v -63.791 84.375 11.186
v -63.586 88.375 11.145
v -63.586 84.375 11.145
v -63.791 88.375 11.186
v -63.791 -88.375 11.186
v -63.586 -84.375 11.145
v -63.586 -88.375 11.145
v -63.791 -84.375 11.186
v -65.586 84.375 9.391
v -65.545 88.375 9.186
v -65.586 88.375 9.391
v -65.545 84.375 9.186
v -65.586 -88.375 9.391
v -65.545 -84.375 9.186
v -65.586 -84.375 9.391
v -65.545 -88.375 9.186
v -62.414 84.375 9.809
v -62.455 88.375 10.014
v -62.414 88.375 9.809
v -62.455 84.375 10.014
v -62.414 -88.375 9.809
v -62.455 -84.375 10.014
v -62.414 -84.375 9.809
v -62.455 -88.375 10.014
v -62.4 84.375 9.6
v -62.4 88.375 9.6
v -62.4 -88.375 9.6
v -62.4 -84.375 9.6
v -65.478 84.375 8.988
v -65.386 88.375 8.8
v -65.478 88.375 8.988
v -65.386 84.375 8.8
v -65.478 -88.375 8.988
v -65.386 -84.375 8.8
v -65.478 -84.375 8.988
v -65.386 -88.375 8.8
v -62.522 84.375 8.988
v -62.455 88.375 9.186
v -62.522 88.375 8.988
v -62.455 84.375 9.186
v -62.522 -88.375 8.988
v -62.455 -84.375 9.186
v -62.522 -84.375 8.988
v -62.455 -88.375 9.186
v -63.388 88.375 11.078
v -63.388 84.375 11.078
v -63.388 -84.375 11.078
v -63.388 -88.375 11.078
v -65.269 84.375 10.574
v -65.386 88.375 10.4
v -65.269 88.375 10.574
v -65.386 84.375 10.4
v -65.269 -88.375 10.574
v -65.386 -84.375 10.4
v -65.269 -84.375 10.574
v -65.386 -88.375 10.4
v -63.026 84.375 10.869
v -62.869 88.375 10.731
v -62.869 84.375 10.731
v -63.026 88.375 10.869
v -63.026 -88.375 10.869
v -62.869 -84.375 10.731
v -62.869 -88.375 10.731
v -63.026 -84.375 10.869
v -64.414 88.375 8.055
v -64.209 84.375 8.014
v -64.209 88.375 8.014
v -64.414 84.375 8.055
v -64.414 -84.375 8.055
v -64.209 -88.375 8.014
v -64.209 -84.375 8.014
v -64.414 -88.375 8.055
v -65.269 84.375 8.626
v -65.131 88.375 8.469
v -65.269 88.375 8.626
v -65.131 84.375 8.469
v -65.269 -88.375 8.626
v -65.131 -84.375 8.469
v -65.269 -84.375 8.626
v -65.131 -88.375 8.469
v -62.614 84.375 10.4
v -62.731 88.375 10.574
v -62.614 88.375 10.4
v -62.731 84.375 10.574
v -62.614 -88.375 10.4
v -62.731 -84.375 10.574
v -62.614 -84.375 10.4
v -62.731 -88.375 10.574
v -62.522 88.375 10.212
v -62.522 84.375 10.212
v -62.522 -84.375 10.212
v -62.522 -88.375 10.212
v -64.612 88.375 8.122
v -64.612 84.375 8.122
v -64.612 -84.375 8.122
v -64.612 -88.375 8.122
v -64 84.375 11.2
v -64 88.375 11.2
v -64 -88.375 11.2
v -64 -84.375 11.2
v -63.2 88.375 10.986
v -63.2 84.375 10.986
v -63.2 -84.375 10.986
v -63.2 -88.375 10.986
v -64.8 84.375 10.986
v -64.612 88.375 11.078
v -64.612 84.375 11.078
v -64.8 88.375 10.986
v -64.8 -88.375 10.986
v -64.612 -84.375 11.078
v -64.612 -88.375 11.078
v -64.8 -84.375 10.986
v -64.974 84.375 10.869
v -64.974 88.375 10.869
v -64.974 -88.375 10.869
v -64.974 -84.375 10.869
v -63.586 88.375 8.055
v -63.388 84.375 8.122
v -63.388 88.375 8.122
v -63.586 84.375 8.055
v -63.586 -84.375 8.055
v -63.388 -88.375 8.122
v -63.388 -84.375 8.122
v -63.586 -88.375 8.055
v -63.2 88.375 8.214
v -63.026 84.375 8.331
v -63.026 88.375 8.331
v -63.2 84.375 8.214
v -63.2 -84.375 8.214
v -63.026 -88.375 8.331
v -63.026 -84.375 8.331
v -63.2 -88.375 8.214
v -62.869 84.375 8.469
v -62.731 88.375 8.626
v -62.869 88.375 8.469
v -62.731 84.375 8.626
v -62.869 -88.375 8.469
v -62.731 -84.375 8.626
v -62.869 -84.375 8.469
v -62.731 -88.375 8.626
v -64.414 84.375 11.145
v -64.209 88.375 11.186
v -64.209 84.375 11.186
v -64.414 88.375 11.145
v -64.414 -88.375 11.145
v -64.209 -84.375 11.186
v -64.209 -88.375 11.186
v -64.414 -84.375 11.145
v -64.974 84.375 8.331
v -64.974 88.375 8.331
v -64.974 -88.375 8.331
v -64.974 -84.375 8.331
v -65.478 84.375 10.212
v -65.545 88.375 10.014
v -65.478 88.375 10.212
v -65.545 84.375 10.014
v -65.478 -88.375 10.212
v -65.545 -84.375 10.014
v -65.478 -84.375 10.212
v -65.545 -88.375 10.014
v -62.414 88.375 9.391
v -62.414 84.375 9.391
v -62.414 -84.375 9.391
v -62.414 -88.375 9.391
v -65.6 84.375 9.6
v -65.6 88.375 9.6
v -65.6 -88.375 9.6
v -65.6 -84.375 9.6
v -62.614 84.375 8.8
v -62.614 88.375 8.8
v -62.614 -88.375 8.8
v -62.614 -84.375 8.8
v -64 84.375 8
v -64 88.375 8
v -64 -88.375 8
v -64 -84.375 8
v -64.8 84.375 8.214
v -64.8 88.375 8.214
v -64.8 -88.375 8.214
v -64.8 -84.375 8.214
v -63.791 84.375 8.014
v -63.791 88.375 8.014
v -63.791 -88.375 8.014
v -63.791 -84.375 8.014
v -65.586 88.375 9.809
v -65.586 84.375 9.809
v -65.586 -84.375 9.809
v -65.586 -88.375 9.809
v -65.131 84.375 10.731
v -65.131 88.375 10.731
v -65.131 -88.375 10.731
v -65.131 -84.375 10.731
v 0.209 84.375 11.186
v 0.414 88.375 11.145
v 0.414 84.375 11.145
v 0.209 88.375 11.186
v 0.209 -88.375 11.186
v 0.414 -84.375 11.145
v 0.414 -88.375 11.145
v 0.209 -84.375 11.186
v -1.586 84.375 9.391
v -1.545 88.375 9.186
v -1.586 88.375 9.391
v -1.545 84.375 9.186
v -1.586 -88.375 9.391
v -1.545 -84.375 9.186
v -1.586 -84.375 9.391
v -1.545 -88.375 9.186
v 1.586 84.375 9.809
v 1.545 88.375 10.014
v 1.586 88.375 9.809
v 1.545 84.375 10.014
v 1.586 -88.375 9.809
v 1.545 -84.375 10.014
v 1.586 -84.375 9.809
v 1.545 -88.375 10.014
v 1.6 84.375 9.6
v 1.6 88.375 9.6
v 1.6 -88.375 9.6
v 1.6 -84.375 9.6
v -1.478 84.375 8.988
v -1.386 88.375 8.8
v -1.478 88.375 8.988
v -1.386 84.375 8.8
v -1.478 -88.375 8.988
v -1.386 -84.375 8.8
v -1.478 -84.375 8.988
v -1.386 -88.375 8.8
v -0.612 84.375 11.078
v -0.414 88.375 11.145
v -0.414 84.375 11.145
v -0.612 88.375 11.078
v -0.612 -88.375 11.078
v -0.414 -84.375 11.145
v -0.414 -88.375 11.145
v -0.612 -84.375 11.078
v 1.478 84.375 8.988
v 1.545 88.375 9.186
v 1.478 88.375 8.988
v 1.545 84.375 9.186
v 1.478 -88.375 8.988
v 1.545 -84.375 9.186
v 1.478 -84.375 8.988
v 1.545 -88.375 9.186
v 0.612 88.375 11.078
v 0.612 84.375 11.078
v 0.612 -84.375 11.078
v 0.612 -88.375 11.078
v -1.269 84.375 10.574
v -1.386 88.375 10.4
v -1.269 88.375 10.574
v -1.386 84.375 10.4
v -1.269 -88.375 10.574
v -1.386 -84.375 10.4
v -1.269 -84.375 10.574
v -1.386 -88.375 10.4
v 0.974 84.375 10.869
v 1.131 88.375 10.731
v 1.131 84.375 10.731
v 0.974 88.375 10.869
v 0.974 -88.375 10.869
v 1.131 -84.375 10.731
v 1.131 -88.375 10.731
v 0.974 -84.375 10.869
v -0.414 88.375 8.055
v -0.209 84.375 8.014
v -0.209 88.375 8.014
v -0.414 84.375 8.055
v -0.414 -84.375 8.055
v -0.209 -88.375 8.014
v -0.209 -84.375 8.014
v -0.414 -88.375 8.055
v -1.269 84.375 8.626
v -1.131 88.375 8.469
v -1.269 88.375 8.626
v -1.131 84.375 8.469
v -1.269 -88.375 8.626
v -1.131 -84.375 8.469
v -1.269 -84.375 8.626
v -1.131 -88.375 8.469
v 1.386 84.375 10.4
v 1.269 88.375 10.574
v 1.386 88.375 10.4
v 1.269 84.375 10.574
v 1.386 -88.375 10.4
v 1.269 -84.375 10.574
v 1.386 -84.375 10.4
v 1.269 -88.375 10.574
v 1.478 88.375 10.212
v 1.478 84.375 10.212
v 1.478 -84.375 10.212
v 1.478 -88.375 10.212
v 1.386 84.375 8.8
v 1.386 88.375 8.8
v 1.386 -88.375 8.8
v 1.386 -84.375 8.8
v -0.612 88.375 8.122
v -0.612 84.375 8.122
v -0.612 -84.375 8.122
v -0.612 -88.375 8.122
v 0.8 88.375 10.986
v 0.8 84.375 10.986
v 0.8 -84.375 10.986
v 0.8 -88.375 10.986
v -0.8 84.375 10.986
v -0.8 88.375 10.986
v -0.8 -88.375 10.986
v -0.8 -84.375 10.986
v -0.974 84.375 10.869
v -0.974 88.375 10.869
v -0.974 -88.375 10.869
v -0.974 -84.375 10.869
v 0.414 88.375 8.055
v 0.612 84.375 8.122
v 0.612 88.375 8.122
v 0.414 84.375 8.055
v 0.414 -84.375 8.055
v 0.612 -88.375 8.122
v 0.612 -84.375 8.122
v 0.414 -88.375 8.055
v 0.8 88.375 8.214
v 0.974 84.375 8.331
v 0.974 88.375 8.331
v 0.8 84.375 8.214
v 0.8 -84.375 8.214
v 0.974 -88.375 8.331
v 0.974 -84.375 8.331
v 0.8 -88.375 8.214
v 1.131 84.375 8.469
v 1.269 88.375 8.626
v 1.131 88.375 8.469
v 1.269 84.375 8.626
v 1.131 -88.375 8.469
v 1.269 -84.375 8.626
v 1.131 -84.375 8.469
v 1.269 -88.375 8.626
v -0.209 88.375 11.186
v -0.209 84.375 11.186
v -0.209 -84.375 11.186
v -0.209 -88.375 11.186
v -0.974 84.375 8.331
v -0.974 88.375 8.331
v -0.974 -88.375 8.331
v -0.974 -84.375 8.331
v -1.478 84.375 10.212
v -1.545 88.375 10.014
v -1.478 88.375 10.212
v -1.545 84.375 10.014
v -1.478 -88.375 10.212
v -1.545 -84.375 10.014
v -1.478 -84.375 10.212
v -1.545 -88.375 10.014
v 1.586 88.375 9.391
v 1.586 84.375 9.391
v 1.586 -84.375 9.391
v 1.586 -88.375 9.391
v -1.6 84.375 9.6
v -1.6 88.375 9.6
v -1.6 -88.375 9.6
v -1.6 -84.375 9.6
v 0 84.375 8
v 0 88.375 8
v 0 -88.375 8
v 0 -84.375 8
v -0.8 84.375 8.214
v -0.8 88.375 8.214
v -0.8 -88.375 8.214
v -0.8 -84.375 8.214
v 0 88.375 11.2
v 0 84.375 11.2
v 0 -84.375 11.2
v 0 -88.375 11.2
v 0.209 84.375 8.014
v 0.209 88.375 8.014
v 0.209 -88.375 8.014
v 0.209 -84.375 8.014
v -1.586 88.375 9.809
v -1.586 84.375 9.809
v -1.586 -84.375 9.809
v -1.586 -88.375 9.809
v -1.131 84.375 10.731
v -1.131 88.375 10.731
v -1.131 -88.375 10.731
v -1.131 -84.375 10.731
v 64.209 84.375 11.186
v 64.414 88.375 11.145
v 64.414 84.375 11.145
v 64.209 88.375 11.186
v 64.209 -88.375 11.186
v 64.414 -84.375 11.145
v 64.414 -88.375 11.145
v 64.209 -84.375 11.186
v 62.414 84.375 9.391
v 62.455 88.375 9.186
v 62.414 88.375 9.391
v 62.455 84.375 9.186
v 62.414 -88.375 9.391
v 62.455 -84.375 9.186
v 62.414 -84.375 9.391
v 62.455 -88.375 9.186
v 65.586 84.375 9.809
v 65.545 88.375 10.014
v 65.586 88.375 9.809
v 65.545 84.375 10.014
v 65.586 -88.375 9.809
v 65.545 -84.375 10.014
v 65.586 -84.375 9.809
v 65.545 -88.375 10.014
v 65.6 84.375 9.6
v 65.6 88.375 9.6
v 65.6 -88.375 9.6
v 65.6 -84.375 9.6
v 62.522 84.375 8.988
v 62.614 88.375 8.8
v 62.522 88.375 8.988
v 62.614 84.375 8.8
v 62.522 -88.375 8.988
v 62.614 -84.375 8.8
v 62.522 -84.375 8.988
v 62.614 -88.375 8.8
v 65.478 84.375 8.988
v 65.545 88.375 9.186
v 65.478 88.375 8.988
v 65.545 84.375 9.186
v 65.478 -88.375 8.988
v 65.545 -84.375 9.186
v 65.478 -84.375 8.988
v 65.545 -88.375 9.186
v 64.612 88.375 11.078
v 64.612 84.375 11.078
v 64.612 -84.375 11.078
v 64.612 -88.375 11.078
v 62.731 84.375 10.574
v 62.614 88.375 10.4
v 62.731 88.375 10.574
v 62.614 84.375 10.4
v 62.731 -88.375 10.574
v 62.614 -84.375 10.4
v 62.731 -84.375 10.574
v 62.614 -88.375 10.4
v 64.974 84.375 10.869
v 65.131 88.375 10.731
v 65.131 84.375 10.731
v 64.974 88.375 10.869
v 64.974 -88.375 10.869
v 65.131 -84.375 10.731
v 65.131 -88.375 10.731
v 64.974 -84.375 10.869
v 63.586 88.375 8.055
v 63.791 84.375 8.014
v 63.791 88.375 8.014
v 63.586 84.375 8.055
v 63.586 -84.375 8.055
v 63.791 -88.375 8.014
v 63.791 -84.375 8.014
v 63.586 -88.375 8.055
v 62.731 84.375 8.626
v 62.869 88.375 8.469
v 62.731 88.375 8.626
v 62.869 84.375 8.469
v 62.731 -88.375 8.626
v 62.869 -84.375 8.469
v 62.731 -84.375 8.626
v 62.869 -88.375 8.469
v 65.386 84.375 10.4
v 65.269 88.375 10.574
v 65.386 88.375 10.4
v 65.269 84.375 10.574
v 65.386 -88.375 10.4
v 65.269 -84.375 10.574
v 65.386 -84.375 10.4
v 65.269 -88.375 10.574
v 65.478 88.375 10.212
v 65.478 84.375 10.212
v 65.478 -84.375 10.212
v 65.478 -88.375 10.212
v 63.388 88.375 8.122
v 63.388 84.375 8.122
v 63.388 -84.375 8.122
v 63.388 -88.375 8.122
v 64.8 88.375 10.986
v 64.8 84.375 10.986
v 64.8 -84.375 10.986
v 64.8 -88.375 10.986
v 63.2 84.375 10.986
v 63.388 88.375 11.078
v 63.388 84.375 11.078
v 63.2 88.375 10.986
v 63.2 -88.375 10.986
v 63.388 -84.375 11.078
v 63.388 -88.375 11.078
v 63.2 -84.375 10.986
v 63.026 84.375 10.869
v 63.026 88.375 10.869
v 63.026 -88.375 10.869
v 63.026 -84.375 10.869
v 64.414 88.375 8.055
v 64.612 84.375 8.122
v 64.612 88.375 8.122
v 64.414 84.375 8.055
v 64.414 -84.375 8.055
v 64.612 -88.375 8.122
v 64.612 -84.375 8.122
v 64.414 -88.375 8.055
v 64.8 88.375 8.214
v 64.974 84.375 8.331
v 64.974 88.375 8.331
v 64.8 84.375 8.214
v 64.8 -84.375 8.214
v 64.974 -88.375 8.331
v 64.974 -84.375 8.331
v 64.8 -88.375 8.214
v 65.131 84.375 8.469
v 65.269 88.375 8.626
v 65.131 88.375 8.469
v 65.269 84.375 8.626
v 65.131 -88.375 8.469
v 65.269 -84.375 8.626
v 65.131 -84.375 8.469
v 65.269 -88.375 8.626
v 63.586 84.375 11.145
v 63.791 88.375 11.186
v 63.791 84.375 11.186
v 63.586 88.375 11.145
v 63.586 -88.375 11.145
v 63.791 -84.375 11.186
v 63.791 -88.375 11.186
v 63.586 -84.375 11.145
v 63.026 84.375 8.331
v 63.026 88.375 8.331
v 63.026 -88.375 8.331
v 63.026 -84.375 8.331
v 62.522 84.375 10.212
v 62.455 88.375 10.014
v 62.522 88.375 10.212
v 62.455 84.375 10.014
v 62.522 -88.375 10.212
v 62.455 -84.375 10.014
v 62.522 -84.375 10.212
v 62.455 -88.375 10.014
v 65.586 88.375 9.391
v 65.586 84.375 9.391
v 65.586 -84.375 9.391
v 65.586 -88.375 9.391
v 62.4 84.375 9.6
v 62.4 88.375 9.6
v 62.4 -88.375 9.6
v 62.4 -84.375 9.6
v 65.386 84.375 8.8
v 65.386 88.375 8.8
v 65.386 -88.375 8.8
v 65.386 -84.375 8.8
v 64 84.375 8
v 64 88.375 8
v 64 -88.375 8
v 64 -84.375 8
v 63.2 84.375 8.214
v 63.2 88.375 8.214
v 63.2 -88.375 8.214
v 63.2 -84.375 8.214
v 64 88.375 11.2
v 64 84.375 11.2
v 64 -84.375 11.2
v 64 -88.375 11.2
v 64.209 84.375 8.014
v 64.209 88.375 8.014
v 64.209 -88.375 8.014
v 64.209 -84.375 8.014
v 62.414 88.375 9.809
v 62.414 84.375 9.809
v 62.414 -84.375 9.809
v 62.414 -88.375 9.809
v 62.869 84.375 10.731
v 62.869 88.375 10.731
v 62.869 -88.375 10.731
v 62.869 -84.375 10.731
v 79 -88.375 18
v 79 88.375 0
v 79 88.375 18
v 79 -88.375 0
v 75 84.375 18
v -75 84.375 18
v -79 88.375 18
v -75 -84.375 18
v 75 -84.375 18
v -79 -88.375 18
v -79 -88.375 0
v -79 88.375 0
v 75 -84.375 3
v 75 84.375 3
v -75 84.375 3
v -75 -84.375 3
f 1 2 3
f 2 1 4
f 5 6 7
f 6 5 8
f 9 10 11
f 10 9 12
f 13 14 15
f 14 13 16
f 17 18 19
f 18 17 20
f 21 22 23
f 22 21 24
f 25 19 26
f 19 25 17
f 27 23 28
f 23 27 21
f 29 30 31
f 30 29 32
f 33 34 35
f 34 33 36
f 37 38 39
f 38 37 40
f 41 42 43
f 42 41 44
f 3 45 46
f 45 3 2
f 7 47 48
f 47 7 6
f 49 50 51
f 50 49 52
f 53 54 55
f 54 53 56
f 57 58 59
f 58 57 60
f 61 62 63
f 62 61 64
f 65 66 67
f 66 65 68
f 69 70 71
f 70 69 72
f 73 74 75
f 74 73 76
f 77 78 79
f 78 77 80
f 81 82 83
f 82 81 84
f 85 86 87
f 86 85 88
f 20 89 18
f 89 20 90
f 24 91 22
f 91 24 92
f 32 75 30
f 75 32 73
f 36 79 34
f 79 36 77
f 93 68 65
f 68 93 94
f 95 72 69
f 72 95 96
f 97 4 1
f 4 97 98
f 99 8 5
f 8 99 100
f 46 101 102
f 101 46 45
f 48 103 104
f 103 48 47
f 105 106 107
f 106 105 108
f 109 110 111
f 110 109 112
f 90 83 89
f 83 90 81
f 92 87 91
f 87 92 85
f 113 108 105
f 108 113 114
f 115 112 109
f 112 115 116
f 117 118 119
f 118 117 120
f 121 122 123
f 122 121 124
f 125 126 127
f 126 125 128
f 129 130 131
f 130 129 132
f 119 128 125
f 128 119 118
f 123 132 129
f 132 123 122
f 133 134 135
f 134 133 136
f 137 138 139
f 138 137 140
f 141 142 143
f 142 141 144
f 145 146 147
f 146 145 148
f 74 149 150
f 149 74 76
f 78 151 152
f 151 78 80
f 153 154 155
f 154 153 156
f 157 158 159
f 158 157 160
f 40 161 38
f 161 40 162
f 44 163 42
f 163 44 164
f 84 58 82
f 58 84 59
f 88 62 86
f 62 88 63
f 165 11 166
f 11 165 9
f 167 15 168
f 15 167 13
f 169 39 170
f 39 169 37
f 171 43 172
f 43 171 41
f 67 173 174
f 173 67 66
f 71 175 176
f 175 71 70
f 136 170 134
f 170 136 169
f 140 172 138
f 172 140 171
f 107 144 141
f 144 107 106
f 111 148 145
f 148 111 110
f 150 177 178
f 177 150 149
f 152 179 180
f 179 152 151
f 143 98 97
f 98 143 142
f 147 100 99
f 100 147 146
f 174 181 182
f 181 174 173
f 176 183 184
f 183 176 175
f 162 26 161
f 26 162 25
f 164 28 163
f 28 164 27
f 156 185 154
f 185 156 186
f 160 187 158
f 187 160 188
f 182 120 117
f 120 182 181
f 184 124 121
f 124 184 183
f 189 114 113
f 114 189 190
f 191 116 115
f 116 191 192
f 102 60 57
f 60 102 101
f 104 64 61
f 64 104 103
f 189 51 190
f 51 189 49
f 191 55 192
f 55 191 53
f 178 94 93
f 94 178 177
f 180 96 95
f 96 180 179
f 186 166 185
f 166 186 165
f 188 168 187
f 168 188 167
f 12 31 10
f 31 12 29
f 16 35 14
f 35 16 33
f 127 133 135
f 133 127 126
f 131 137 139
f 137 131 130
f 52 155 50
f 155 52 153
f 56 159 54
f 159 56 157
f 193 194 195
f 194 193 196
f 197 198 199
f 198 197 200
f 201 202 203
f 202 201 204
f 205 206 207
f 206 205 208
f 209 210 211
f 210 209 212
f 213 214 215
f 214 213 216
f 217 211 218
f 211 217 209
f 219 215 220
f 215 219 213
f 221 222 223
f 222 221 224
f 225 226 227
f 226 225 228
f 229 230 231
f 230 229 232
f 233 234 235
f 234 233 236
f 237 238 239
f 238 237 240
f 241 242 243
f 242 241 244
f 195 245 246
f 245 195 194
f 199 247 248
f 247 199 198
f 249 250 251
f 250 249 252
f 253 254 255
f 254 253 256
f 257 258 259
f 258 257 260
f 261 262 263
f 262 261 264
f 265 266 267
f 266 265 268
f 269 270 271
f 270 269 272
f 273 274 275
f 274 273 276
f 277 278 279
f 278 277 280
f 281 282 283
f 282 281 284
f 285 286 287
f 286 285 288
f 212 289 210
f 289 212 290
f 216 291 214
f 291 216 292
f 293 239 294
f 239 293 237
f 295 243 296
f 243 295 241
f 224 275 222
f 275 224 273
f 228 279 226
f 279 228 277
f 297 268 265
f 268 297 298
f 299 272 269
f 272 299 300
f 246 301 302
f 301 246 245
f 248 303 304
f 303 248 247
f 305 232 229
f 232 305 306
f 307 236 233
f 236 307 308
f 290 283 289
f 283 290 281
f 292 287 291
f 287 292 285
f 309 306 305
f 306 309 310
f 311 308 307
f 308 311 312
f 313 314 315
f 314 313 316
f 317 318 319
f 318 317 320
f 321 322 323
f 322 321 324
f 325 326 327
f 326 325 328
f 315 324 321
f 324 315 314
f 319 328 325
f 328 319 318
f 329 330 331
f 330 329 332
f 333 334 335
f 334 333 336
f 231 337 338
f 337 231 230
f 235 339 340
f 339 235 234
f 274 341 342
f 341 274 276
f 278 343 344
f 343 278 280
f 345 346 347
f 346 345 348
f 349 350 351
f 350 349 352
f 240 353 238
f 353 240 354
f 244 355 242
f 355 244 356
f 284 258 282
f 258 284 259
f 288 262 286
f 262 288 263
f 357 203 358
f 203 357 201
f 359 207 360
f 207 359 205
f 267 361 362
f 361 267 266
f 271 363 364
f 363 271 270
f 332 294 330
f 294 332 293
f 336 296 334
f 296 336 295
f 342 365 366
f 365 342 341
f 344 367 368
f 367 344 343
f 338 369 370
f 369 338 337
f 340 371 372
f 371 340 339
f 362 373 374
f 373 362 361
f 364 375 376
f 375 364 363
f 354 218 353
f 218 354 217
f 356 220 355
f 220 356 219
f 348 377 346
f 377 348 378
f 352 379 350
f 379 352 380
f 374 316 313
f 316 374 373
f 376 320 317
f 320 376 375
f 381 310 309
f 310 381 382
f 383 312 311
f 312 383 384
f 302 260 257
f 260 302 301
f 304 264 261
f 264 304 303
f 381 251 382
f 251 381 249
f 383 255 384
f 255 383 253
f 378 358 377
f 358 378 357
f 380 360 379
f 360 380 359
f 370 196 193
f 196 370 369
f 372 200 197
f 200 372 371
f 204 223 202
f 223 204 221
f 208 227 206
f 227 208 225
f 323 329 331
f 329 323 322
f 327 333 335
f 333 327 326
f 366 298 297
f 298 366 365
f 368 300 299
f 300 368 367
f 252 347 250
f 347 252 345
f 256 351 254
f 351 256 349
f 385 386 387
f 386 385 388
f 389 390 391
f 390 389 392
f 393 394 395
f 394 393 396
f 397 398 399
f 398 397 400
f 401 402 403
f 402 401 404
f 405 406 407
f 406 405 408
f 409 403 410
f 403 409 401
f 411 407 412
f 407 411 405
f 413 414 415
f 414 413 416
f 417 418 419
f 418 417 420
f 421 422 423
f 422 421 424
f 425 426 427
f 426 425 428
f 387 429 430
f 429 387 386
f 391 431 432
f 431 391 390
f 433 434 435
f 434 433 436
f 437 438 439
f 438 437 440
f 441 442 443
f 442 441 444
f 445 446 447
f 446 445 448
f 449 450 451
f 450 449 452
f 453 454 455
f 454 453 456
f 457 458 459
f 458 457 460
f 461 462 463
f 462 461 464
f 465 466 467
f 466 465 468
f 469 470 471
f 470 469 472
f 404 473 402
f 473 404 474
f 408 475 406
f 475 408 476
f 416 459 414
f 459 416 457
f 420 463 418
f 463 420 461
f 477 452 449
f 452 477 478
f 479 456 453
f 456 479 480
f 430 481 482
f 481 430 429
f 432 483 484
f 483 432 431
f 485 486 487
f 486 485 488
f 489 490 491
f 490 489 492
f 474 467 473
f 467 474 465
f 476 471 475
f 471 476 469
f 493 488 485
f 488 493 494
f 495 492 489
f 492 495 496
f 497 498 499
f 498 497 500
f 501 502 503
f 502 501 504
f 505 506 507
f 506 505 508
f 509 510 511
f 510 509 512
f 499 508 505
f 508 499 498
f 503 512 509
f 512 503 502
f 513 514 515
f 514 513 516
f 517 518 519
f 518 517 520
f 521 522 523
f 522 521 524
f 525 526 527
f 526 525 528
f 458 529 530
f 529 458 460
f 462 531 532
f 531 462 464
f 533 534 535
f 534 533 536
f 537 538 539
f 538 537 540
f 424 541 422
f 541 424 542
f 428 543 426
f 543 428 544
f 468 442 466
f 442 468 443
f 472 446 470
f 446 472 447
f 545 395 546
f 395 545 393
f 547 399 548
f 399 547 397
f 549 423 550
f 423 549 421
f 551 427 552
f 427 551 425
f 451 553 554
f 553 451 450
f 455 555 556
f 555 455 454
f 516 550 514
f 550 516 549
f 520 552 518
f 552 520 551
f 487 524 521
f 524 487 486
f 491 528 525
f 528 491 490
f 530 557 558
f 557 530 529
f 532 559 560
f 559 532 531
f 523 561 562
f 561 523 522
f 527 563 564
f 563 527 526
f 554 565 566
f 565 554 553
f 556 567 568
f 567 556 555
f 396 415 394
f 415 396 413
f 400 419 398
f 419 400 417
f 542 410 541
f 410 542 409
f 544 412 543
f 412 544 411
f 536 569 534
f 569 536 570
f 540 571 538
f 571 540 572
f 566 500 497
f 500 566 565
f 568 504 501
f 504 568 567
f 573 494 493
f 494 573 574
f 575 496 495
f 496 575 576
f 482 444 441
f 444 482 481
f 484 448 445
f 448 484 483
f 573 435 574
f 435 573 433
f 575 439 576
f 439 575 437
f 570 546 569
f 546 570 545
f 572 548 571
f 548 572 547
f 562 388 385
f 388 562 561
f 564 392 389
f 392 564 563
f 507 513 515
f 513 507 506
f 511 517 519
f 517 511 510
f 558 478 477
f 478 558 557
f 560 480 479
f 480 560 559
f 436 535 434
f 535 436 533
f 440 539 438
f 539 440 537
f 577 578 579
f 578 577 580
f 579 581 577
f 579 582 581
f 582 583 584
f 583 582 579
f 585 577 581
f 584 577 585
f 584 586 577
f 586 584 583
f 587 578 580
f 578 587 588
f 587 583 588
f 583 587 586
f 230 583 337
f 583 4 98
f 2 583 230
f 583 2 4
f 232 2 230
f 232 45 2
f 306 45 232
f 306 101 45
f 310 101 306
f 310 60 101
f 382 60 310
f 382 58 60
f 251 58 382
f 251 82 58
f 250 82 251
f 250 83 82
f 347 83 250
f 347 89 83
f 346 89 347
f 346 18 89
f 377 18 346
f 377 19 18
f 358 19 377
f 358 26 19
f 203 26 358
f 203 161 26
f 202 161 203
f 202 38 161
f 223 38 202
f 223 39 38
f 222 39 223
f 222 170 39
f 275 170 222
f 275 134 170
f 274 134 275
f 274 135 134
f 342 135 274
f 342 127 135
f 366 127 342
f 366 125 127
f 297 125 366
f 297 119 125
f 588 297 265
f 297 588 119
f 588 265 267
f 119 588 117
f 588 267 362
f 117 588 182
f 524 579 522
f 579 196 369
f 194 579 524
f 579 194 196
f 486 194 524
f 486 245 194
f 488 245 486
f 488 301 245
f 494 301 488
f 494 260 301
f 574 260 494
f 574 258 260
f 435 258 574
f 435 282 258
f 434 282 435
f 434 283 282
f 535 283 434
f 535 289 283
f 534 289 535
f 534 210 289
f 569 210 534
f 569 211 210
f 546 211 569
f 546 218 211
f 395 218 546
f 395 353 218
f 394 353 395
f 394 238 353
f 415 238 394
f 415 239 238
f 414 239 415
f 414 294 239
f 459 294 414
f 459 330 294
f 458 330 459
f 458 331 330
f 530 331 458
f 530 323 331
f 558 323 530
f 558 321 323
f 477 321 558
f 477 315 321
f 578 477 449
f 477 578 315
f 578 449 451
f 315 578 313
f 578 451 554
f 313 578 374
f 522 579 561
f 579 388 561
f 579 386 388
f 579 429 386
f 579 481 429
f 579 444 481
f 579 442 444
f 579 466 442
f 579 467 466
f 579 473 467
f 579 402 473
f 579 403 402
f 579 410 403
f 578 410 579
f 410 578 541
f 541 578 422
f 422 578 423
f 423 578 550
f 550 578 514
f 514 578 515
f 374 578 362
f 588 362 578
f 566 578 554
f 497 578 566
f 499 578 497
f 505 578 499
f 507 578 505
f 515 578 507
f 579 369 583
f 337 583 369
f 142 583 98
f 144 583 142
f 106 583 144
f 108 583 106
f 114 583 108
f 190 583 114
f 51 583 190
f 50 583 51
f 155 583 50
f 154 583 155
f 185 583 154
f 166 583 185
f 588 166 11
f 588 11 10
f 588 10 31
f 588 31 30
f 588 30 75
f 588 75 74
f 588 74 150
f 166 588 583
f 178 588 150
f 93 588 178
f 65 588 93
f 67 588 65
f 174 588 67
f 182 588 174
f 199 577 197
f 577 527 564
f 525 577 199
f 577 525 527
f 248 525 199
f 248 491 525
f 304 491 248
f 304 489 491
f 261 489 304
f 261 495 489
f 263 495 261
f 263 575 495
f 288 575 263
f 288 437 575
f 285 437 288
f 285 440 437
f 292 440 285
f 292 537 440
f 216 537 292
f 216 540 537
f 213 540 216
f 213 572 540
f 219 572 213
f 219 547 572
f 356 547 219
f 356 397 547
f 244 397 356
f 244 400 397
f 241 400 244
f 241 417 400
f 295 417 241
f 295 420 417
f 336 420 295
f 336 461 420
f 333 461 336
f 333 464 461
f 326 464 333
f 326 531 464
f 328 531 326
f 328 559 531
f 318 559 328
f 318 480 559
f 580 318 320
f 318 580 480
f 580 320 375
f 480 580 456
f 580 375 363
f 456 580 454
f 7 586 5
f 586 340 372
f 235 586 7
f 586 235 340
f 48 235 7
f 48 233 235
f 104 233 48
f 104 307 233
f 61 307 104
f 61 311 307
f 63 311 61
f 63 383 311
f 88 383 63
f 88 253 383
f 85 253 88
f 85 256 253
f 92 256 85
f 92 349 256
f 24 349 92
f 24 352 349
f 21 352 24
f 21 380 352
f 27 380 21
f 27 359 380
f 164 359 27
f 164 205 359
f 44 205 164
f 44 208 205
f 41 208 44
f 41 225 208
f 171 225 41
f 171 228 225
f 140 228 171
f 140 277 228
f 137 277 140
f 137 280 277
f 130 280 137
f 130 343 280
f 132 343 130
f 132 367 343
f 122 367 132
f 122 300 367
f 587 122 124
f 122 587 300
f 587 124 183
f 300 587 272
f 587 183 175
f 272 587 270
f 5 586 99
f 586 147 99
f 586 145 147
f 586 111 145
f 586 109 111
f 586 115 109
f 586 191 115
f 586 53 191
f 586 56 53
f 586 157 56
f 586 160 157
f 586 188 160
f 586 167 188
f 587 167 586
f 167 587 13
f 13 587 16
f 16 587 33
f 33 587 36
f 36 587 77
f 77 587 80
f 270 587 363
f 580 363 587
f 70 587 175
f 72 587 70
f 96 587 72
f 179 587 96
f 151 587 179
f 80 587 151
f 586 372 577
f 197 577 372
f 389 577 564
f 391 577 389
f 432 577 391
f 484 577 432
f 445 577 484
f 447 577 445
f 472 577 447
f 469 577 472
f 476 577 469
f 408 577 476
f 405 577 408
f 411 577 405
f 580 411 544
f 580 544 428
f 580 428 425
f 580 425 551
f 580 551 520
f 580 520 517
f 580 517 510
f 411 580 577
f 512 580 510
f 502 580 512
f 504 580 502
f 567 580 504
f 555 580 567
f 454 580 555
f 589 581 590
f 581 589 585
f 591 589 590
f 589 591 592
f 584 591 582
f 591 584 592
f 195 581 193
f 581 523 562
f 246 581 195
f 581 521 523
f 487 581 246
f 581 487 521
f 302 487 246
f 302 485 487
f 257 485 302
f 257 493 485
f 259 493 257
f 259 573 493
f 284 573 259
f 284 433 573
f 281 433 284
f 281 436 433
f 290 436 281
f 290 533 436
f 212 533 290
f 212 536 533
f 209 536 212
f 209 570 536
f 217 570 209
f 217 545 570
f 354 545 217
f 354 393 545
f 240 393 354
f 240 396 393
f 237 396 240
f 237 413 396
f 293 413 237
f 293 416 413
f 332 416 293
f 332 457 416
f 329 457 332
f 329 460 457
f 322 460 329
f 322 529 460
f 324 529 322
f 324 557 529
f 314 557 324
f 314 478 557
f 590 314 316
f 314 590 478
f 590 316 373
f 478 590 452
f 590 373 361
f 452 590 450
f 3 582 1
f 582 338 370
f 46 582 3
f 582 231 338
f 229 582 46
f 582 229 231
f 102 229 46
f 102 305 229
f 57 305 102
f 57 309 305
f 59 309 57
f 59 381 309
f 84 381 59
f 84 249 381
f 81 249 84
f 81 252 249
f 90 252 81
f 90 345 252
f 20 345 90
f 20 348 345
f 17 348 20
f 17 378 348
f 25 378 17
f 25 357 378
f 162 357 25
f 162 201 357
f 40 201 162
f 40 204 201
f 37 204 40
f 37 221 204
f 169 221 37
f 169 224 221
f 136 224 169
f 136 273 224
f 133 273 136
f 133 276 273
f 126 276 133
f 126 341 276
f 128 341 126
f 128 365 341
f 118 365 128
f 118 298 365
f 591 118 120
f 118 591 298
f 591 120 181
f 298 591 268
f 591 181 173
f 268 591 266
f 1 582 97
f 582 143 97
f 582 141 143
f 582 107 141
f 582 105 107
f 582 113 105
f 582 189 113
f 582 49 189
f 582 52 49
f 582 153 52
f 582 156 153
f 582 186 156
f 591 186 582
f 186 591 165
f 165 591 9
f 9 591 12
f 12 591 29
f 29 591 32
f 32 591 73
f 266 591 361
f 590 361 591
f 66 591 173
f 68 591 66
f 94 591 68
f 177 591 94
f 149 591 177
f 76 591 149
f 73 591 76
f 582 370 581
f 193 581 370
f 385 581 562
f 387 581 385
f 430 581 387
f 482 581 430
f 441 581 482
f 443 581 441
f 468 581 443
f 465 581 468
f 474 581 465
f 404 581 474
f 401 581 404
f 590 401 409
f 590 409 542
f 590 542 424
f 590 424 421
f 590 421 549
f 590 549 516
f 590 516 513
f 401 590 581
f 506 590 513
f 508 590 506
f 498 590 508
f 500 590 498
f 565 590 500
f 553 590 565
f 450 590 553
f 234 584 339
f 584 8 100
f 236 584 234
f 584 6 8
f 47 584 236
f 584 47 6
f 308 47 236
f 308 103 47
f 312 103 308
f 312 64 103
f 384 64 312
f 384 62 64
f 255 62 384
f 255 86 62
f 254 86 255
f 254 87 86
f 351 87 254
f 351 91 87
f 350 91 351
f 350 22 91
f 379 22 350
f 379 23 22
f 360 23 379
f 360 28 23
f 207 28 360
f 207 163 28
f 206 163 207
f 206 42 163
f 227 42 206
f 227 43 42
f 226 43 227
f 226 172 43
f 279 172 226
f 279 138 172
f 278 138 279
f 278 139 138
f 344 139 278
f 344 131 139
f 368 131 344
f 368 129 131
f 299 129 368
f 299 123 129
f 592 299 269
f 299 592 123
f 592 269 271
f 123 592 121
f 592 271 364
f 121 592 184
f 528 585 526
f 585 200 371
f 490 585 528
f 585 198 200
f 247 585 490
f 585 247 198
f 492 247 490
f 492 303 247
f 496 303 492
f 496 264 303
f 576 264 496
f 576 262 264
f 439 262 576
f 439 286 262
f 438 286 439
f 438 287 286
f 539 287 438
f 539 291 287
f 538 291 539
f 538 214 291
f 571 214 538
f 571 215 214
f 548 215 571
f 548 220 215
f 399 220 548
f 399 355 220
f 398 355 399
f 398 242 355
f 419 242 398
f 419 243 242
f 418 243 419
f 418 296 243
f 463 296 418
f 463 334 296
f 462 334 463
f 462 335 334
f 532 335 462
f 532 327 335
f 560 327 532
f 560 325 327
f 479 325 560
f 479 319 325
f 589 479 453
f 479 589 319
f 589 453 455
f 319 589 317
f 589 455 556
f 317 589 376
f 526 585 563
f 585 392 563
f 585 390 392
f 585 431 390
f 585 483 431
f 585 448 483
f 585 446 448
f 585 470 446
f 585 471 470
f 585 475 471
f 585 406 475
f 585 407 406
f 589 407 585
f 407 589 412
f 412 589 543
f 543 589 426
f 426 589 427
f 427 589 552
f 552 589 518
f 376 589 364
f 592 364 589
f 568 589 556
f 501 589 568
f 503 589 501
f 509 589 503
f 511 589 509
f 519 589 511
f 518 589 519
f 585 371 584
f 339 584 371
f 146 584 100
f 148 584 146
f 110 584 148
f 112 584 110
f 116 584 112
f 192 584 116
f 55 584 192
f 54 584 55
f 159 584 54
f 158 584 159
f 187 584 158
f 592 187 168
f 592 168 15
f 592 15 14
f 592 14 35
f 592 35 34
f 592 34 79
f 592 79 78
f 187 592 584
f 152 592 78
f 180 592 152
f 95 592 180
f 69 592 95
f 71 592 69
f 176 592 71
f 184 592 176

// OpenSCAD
// screen_solder_jig — 焊接时给 screen_150x169 定位的 5 面托盘 (2026-07-21 用户)
// 底 + 4 壁, 开口朝上 (+Z); 屏正面朝下落入内腔, 四壁锁位, 背面朝上焊。
// 参数与 build_stl.py 保持一致 (改尺寸两处同步)。

// ===== Parameters =====
cav_w  = 150.0;    // X — 屏宽 (screen_150x169: W=150)
cav_h  = 168.75;   // Y — 屏高 (用户给定 168.75)
depth  = 15.0;     // Z — 内腔深
wall   = 4.0;      // 壁厚
floor_t = 3.0;     // 底厚

hole_d  = 3.2;             // M3 通孔
hole_xs = [-64, 0, 64];    // X 间距 64
hole_z  = floor_t + 6.6;   // 9.6 — 孔心距内腔底 6.6

$fn = 48;
slop = 0.1;

out_w = cav_w + 2*wall;    // 158
out_h = cav_h + 2*wall;    // 176.75
out_z = depth + floor_t;   // 18

module screen_solder_jig() {
    difference() {
        // outer solid block, centered in XY, bottom at Z=0
        translate([-out_w/2, -out_h/2, 0])
            cube([out_w, out_h, out_z]);

        // pocket cavity, centered, open at +Z
        translate([-cav_w/2, -cav_h/2, floor_t])
            cube([cav_w, cav_h, depth + slop]);

        // 3 M3 through-holes along Y — each pierces BOTH ±Y walls
        for (x = hole_xs)
            translate([x, 0, hole_z])
                rotate([90, 0, 0])
                    cylinder(h = out_h + 4, d = hole_d, center = true);
    }
}

screen_solder_jig();
